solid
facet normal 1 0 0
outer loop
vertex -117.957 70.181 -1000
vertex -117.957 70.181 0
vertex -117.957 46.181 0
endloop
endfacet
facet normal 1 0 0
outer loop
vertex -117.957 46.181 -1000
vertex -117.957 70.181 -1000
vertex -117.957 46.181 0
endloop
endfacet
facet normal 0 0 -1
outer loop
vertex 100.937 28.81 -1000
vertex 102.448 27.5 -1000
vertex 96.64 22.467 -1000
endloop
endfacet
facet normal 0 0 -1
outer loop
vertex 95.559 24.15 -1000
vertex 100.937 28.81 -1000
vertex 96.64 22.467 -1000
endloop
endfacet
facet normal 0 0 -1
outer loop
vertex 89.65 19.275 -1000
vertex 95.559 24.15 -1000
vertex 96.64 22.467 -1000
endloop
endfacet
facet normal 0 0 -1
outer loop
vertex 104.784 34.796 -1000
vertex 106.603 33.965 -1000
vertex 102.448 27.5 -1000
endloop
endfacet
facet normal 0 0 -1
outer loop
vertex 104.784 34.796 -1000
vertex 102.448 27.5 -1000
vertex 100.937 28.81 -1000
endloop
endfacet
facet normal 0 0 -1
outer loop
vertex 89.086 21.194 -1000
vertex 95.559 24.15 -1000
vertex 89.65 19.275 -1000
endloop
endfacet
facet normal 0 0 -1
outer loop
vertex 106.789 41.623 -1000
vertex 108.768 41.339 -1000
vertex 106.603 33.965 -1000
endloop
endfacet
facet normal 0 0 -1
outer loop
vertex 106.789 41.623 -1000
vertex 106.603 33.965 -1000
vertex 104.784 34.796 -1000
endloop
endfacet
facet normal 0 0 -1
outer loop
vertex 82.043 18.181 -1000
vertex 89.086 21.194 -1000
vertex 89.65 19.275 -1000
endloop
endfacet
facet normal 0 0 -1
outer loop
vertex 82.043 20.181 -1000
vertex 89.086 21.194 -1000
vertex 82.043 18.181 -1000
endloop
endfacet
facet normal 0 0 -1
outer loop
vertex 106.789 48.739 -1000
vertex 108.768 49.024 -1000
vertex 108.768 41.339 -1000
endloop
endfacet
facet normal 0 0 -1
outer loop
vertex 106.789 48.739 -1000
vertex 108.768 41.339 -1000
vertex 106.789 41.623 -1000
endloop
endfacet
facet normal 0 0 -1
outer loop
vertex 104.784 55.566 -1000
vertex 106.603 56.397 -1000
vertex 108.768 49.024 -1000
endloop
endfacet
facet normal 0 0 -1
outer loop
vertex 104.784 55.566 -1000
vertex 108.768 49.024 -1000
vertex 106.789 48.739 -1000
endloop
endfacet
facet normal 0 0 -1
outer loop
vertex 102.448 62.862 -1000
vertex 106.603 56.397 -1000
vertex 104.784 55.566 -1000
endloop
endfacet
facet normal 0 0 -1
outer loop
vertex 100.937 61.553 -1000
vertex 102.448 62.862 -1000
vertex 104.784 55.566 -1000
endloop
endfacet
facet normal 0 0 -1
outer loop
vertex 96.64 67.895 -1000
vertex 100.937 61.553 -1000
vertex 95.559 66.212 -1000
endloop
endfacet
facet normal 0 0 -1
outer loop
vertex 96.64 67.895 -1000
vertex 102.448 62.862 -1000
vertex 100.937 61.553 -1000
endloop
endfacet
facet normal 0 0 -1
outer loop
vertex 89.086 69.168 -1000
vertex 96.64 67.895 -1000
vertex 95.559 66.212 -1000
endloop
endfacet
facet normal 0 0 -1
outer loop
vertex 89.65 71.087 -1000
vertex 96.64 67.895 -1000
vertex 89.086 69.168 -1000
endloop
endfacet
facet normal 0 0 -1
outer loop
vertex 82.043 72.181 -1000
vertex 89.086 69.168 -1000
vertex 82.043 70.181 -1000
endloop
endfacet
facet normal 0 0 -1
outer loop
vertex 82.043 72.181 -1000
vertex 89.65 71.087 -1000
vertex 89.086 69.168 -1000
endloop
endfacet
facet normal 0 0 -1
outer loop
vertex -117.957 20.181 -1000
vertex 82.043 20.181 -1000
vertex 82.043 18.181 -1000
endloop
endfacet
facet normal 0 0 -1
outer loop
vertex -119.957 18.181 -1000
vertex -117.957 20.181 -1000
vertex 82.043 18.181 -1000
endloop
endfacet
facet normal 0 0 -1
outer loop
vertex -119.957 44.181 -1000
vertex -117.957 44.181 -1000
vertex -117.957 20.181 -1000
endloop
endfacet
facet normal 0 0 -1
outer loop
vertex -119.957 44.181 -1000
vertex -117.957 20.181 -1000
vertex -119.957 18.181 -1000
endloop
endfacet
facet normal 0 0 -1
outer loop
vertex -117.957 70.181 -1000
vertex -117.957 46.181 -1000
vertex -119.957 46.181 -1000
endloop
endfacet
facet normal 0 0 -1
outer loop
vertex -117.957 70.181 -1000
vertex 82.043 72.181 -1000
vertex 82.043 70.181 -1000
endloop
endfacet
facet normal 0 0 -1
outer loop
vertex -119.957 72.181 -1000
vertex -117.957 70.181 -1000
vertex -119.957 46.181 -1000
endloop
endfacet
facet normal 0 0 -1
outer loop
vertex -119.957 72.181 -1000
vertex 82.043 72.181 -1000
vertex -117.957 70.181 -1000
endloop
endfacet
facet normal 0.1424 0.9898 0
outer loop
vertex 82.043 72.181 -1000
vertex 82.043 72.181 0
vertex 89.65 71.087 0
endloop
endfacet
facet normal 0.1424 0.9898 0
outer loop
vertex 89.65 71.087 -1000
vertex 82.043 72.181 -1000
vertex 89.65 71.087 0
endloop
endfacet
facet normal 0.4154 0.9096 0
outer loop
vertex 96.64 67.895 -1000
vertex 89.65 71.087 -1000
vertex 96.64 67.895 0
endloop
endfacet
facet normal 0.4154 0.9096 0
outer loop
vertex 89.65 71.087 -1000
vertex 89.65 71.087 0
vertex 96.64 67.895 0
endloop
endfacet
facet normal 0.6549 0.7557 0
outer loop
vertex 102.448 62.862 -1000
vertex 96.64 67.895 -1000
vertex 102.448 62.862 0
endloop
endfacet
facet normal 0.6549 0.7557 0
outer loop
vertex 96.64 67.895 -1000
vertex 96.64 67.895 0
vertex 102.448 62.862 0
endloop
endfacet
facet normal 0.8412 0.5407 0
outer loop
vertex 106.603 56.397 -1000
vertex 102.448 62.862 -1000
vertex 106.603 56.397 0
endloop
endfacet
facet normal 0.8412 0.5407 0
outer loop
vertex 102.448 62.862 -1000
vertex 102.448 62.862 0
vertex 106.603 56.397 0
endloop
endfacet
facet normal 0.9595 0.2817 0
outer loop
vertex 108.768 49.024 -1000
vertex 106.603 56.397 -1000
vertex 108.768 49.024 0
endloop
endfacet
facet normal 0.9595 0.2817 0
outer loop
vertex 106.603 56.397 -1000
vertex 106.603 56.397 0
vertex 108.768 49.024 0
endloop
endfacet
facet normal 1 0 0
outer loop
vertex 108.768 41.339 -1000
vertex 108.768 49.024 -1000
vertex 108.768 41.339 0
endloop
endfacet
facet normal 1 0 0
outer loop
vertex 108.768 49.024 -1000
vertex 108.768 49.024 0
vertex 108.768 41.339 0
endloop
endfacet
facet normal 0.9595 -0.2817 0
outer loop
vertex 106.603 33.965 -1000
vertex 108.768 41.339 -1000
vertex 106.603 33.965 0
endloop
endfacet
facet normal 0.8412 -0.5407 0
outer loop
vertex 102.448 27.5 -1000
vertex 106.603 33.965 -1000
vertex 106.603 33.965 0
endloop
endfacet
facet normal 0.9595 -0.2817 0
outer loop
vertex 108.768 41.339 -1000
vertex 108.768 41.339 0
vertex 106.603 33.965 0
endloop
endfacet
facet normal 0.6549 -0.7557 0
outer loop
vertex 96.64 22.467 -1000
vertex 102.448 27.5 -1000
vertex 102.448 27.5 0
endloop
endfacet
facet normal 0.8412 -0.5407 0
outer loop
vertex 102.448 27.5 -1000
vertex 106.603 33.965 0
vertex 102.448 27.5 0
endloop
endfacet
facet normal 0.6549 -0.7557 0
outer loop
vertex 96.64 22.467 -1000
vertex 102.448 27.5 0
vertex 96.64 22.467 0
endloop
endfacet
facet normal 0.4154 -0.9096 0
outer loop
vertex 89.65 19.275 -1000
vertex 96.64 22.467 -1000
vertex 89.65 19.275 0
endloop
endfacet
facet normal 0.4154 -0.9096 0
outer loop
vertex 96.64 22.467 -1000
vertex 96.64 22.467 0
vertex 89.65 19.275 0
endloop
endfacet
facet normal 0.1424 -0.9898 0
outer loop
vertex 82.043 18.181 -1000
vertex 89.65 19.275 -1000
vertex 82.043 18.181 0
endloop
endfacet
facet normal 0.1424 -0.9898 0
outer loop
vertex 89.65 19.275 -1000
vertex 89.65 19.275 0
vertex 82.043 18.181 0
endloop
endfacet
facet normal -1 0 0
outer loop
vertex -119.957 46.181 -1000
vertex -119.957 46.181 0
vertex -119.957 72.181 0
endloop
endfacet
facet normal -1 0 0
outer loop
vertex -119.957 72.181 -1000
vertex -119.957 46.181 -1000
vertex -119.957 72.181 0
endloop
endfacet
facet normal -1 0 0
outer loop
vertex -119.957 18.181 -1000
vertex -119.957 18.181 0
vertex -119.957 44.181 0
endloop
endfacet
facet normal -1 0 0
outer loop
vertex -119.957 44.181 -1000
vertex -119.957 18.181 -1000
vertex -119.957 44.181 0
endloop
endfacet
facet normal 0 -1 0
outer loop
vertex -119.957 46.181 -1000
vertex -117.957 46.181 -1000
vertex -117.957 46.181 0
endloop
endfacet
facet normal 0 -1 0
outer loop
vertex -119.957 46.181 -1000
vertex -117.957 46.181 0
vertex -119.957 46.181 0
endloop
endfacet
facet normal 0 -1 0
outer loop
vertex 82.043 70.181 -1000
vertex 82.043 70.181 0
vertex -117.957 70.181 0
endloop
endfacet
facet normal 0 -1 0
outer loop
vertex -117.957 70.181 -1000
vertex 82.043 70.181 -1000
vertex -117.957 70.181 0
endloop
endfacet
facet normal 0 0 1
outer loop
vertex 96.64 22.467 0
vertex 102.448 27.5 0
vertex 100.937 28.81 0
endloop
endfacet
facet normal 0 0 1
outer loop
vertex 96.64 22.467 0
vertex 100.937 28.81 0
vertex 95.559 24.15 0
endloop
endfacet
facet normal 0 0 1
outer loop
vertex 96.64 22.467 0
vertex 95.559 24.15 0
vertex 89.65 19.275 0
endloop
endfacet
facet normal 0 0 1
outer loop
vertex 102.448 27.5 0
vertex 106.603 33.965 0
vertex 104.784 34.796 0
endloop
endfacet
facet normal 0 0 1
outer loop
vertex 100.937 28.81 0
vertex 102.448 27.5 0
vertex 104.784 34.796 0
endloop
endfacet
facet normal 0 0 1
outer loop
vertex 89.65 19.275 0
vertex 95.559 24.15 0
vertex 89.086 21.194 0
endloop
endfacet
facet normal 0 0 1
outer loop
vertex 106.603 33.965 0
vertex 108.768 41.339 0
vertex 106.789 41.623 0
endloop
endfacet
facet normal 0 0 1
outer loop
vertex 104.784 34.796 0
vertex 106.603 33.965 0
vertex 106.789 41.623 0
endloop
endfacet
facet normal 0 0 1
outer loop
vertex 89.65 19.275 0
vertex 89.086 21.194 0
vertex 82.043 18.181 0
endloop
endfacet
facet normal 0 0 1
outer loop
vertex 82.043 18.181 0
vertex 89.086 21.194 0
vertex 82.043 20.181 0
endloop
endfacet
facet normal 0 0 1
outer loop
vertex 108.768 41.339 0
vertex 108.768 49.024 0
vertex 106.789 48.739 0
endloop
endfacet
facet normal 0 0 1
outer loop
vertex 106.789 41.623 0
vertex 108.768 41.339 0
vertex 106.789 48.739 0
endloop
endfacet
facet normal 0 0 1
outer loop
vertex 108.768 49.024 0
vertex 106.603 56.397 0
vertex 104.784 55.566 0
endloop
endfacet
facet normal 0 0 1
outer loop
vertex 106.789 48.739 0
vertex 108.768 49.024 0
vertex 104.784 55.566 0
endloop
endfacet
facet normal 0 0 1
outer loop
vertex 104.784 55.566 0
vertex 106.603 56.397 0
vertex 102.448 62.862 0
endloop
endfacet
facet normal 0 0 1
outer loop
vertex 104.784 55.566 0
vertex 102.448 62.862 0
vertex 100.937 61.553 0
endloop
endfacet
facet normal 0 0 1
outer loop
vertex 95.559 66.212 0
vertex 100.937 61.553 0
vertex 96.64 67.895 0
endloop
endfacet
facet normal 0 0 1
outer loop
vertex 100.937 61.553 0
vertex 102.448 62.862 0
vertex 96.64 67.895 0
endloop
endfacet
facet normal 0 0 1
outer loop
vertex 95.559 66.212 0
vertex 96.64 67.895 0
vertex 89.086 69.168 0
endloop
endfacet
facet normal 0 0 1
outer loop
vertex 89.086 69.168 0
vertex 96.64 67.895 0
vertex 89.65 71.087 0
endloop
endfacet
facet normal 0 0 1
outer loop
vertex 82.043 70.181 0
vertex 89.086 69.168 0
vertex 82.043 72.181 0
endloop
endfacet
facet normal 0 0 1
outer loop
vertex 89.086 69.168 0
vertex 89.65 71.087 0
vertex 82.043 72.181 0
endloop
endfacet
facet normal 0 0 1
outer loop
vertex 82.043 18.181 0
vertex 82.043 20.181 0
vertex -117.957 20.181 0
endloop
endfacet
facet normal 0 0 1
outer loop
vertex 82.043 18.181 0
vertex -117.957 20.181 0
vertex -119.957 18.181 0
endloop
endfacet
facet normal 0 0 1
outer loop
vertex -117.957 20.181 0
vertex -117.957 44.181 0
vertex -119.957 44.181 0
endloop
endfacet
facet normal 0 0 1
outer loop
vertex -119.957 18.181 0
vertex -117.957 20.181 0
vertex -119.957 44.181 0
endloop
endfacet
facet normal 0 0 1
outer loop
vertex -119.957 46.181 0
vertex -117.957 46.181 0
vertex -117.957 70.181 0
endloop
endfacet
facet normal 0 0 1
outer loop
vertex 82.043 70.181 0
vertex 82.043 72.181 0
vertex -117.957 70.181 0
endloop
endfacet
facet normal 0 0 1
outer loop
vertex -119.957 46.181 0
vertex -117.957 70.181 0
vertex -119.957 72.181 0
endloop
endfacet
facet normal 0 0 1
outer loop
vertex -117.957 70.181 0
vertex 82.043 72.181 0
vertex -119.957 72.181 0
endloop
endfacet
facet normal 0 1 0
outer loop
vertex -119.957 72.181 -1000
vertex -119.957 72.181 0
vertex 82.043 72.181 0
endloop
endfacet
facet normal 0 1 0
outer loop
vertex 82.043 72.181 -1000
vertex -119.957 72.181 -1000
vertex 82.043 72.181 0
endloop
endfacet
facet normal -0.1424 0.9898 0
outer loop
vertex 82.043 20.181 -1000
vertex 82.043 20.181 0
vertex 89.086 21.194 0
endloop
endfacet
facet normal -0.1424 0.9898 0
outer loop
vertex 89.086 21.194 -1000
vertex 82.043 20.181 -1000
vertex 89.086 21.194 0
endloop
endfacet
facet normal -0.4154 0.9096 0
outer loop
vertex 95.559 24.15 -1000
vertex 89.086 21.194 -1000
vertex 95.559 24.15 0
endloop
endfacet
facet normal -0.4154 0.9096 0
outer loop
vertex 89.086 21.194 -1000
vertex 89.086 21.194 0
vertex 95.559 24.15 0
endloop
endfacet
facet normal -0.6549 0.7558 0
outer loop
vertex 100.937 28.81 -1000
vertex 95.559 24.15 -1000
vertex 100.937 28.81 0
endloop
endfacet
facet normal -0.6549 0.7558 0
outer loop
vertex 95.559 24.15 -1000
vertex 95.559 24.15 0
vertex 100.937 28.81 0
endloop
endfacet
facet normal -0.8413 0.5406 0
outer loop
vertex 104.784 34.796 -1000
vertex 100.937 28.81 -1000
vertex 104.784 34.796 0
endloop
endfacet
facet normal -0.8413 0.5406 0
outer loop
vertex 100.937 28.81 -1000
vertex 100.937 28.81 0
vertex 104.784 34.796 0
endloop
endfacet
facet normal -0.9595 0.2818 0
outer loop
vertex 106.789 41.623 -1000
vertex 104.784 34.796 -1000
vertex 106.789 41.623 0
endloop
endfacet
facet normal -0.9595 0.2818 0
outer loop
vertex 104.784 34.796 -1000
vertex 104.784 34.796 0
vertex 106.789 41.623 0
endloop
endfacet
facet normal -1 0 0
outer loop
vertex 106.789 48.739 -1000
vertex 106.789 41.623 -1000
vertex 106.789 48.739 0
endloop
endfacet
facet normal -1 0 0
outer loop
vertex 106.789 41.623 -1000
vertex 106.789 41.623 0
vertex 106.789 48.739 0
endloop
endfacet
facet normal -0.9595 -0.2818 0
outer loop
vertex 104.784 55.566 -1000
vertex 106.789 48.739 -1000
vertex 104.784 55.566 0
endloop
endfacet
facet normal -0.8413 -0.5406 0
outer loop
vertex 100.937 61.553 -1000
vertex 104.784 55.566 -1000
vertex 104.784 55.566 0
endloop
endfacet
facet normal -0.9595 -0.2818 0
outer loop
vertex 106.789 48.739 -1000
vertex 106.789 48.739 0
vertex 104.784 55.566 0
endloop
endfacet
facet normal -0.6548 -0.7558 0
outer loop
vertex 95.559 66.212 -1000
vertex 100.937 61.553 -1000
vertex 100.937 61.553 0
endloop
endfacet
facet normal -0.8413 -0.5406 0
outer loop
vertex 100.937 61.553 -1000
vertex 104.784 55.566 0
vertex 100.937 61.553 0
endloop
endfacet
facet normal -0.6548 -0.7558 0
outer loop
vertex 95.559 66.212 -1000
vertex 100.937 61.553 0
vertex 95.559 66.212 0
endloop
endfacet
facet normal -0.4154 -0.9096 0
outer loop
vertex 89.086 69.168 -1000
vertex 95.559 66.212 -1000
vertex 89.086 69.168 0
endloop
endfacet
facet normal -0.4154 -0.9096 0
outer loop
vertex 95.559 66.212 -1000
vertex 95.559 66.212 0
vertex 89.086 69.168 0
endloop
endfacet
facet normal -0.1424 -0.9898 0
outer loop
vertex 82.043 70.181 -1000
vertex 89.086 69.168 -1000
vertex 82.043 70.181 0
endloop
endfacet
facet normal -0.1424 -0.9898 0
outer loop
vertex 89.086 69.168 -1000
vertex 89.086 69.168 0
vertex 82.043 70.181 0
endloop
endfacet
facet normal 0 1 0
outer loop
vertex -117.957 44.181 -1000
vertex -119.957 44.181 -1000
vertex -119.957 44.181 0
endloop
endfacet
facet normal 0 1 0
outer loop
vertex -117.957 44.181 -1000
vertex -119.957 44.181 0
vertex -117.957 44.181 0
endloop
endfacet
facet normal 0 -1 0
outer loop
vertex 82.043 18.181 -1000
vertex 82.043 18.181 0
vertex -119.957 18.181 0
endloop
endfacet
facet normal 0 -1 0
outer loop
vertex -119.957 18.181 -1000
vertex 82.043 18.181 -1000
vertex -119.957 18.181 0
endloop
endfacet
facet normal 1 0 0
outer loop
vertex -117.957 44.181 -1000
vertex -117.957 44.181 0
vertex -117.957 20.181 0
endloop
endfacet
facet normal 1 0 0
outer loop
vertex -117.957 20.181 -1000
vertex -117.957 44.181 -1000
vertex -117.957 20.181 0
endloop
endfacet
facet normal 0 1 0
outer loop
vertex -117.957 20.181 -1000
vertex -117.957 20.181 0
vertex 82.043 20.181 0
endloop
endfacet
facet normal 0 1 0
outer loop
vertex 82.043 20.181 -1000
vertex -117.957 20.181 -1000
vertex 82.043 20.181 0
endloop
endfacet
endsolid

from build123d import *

# Parameters (mm, degrees)
BOSS_EXTRUDE1_DEPTH = 1000


with BuildPart() as part:
    # Sketch1 → Boss-Extrude1 (new body)
    with BuildSketch(Plane.XY):
        with BuildLine():
            Line((-119.957004607, 72.181122853), (82.042995393, 72.181122853))
            ThreePointArc((82.042995393, 72.181122853), (109.042995393, 45.181122853), (82.042995393, 18.181122853))
            Line((82.042995393, 18.181122853), (-119.957004607, 18.181122853))
            Line((-119.957004607, 18.181122853), (-119.957004607, 44.181122853))
            Line((-119.957004607, 44.181122853), (-117.957004607, 44.181122853))
            Line((-117.957004607, 44.181122853), (-117.957004607, 20.181122853))
            Line((-117.957004607, 20.181122853), (82.042995393, 20.181122853))
            ThreePointArc((82.042995393, 20.181122853), (107.042995393, 45.181122853), (82.042995393, 70.181122853))
            Line((82.042995393, 70.181122853), (-117.957004607, 70.181122853))
            Line((-117.957004607, 70.181122853), (-117.957004607, 46.181122853))
            Line((-117.957004607, 46.181122853), (-119.957004607, 46.181122853))
            Line((-119.957004607, 46.181122853), (-119.957004607, 72.181122853))
        make_face()
    extrude(amount=-BOSS_EXTRUDE1_DEPTH)


solid = part.part
